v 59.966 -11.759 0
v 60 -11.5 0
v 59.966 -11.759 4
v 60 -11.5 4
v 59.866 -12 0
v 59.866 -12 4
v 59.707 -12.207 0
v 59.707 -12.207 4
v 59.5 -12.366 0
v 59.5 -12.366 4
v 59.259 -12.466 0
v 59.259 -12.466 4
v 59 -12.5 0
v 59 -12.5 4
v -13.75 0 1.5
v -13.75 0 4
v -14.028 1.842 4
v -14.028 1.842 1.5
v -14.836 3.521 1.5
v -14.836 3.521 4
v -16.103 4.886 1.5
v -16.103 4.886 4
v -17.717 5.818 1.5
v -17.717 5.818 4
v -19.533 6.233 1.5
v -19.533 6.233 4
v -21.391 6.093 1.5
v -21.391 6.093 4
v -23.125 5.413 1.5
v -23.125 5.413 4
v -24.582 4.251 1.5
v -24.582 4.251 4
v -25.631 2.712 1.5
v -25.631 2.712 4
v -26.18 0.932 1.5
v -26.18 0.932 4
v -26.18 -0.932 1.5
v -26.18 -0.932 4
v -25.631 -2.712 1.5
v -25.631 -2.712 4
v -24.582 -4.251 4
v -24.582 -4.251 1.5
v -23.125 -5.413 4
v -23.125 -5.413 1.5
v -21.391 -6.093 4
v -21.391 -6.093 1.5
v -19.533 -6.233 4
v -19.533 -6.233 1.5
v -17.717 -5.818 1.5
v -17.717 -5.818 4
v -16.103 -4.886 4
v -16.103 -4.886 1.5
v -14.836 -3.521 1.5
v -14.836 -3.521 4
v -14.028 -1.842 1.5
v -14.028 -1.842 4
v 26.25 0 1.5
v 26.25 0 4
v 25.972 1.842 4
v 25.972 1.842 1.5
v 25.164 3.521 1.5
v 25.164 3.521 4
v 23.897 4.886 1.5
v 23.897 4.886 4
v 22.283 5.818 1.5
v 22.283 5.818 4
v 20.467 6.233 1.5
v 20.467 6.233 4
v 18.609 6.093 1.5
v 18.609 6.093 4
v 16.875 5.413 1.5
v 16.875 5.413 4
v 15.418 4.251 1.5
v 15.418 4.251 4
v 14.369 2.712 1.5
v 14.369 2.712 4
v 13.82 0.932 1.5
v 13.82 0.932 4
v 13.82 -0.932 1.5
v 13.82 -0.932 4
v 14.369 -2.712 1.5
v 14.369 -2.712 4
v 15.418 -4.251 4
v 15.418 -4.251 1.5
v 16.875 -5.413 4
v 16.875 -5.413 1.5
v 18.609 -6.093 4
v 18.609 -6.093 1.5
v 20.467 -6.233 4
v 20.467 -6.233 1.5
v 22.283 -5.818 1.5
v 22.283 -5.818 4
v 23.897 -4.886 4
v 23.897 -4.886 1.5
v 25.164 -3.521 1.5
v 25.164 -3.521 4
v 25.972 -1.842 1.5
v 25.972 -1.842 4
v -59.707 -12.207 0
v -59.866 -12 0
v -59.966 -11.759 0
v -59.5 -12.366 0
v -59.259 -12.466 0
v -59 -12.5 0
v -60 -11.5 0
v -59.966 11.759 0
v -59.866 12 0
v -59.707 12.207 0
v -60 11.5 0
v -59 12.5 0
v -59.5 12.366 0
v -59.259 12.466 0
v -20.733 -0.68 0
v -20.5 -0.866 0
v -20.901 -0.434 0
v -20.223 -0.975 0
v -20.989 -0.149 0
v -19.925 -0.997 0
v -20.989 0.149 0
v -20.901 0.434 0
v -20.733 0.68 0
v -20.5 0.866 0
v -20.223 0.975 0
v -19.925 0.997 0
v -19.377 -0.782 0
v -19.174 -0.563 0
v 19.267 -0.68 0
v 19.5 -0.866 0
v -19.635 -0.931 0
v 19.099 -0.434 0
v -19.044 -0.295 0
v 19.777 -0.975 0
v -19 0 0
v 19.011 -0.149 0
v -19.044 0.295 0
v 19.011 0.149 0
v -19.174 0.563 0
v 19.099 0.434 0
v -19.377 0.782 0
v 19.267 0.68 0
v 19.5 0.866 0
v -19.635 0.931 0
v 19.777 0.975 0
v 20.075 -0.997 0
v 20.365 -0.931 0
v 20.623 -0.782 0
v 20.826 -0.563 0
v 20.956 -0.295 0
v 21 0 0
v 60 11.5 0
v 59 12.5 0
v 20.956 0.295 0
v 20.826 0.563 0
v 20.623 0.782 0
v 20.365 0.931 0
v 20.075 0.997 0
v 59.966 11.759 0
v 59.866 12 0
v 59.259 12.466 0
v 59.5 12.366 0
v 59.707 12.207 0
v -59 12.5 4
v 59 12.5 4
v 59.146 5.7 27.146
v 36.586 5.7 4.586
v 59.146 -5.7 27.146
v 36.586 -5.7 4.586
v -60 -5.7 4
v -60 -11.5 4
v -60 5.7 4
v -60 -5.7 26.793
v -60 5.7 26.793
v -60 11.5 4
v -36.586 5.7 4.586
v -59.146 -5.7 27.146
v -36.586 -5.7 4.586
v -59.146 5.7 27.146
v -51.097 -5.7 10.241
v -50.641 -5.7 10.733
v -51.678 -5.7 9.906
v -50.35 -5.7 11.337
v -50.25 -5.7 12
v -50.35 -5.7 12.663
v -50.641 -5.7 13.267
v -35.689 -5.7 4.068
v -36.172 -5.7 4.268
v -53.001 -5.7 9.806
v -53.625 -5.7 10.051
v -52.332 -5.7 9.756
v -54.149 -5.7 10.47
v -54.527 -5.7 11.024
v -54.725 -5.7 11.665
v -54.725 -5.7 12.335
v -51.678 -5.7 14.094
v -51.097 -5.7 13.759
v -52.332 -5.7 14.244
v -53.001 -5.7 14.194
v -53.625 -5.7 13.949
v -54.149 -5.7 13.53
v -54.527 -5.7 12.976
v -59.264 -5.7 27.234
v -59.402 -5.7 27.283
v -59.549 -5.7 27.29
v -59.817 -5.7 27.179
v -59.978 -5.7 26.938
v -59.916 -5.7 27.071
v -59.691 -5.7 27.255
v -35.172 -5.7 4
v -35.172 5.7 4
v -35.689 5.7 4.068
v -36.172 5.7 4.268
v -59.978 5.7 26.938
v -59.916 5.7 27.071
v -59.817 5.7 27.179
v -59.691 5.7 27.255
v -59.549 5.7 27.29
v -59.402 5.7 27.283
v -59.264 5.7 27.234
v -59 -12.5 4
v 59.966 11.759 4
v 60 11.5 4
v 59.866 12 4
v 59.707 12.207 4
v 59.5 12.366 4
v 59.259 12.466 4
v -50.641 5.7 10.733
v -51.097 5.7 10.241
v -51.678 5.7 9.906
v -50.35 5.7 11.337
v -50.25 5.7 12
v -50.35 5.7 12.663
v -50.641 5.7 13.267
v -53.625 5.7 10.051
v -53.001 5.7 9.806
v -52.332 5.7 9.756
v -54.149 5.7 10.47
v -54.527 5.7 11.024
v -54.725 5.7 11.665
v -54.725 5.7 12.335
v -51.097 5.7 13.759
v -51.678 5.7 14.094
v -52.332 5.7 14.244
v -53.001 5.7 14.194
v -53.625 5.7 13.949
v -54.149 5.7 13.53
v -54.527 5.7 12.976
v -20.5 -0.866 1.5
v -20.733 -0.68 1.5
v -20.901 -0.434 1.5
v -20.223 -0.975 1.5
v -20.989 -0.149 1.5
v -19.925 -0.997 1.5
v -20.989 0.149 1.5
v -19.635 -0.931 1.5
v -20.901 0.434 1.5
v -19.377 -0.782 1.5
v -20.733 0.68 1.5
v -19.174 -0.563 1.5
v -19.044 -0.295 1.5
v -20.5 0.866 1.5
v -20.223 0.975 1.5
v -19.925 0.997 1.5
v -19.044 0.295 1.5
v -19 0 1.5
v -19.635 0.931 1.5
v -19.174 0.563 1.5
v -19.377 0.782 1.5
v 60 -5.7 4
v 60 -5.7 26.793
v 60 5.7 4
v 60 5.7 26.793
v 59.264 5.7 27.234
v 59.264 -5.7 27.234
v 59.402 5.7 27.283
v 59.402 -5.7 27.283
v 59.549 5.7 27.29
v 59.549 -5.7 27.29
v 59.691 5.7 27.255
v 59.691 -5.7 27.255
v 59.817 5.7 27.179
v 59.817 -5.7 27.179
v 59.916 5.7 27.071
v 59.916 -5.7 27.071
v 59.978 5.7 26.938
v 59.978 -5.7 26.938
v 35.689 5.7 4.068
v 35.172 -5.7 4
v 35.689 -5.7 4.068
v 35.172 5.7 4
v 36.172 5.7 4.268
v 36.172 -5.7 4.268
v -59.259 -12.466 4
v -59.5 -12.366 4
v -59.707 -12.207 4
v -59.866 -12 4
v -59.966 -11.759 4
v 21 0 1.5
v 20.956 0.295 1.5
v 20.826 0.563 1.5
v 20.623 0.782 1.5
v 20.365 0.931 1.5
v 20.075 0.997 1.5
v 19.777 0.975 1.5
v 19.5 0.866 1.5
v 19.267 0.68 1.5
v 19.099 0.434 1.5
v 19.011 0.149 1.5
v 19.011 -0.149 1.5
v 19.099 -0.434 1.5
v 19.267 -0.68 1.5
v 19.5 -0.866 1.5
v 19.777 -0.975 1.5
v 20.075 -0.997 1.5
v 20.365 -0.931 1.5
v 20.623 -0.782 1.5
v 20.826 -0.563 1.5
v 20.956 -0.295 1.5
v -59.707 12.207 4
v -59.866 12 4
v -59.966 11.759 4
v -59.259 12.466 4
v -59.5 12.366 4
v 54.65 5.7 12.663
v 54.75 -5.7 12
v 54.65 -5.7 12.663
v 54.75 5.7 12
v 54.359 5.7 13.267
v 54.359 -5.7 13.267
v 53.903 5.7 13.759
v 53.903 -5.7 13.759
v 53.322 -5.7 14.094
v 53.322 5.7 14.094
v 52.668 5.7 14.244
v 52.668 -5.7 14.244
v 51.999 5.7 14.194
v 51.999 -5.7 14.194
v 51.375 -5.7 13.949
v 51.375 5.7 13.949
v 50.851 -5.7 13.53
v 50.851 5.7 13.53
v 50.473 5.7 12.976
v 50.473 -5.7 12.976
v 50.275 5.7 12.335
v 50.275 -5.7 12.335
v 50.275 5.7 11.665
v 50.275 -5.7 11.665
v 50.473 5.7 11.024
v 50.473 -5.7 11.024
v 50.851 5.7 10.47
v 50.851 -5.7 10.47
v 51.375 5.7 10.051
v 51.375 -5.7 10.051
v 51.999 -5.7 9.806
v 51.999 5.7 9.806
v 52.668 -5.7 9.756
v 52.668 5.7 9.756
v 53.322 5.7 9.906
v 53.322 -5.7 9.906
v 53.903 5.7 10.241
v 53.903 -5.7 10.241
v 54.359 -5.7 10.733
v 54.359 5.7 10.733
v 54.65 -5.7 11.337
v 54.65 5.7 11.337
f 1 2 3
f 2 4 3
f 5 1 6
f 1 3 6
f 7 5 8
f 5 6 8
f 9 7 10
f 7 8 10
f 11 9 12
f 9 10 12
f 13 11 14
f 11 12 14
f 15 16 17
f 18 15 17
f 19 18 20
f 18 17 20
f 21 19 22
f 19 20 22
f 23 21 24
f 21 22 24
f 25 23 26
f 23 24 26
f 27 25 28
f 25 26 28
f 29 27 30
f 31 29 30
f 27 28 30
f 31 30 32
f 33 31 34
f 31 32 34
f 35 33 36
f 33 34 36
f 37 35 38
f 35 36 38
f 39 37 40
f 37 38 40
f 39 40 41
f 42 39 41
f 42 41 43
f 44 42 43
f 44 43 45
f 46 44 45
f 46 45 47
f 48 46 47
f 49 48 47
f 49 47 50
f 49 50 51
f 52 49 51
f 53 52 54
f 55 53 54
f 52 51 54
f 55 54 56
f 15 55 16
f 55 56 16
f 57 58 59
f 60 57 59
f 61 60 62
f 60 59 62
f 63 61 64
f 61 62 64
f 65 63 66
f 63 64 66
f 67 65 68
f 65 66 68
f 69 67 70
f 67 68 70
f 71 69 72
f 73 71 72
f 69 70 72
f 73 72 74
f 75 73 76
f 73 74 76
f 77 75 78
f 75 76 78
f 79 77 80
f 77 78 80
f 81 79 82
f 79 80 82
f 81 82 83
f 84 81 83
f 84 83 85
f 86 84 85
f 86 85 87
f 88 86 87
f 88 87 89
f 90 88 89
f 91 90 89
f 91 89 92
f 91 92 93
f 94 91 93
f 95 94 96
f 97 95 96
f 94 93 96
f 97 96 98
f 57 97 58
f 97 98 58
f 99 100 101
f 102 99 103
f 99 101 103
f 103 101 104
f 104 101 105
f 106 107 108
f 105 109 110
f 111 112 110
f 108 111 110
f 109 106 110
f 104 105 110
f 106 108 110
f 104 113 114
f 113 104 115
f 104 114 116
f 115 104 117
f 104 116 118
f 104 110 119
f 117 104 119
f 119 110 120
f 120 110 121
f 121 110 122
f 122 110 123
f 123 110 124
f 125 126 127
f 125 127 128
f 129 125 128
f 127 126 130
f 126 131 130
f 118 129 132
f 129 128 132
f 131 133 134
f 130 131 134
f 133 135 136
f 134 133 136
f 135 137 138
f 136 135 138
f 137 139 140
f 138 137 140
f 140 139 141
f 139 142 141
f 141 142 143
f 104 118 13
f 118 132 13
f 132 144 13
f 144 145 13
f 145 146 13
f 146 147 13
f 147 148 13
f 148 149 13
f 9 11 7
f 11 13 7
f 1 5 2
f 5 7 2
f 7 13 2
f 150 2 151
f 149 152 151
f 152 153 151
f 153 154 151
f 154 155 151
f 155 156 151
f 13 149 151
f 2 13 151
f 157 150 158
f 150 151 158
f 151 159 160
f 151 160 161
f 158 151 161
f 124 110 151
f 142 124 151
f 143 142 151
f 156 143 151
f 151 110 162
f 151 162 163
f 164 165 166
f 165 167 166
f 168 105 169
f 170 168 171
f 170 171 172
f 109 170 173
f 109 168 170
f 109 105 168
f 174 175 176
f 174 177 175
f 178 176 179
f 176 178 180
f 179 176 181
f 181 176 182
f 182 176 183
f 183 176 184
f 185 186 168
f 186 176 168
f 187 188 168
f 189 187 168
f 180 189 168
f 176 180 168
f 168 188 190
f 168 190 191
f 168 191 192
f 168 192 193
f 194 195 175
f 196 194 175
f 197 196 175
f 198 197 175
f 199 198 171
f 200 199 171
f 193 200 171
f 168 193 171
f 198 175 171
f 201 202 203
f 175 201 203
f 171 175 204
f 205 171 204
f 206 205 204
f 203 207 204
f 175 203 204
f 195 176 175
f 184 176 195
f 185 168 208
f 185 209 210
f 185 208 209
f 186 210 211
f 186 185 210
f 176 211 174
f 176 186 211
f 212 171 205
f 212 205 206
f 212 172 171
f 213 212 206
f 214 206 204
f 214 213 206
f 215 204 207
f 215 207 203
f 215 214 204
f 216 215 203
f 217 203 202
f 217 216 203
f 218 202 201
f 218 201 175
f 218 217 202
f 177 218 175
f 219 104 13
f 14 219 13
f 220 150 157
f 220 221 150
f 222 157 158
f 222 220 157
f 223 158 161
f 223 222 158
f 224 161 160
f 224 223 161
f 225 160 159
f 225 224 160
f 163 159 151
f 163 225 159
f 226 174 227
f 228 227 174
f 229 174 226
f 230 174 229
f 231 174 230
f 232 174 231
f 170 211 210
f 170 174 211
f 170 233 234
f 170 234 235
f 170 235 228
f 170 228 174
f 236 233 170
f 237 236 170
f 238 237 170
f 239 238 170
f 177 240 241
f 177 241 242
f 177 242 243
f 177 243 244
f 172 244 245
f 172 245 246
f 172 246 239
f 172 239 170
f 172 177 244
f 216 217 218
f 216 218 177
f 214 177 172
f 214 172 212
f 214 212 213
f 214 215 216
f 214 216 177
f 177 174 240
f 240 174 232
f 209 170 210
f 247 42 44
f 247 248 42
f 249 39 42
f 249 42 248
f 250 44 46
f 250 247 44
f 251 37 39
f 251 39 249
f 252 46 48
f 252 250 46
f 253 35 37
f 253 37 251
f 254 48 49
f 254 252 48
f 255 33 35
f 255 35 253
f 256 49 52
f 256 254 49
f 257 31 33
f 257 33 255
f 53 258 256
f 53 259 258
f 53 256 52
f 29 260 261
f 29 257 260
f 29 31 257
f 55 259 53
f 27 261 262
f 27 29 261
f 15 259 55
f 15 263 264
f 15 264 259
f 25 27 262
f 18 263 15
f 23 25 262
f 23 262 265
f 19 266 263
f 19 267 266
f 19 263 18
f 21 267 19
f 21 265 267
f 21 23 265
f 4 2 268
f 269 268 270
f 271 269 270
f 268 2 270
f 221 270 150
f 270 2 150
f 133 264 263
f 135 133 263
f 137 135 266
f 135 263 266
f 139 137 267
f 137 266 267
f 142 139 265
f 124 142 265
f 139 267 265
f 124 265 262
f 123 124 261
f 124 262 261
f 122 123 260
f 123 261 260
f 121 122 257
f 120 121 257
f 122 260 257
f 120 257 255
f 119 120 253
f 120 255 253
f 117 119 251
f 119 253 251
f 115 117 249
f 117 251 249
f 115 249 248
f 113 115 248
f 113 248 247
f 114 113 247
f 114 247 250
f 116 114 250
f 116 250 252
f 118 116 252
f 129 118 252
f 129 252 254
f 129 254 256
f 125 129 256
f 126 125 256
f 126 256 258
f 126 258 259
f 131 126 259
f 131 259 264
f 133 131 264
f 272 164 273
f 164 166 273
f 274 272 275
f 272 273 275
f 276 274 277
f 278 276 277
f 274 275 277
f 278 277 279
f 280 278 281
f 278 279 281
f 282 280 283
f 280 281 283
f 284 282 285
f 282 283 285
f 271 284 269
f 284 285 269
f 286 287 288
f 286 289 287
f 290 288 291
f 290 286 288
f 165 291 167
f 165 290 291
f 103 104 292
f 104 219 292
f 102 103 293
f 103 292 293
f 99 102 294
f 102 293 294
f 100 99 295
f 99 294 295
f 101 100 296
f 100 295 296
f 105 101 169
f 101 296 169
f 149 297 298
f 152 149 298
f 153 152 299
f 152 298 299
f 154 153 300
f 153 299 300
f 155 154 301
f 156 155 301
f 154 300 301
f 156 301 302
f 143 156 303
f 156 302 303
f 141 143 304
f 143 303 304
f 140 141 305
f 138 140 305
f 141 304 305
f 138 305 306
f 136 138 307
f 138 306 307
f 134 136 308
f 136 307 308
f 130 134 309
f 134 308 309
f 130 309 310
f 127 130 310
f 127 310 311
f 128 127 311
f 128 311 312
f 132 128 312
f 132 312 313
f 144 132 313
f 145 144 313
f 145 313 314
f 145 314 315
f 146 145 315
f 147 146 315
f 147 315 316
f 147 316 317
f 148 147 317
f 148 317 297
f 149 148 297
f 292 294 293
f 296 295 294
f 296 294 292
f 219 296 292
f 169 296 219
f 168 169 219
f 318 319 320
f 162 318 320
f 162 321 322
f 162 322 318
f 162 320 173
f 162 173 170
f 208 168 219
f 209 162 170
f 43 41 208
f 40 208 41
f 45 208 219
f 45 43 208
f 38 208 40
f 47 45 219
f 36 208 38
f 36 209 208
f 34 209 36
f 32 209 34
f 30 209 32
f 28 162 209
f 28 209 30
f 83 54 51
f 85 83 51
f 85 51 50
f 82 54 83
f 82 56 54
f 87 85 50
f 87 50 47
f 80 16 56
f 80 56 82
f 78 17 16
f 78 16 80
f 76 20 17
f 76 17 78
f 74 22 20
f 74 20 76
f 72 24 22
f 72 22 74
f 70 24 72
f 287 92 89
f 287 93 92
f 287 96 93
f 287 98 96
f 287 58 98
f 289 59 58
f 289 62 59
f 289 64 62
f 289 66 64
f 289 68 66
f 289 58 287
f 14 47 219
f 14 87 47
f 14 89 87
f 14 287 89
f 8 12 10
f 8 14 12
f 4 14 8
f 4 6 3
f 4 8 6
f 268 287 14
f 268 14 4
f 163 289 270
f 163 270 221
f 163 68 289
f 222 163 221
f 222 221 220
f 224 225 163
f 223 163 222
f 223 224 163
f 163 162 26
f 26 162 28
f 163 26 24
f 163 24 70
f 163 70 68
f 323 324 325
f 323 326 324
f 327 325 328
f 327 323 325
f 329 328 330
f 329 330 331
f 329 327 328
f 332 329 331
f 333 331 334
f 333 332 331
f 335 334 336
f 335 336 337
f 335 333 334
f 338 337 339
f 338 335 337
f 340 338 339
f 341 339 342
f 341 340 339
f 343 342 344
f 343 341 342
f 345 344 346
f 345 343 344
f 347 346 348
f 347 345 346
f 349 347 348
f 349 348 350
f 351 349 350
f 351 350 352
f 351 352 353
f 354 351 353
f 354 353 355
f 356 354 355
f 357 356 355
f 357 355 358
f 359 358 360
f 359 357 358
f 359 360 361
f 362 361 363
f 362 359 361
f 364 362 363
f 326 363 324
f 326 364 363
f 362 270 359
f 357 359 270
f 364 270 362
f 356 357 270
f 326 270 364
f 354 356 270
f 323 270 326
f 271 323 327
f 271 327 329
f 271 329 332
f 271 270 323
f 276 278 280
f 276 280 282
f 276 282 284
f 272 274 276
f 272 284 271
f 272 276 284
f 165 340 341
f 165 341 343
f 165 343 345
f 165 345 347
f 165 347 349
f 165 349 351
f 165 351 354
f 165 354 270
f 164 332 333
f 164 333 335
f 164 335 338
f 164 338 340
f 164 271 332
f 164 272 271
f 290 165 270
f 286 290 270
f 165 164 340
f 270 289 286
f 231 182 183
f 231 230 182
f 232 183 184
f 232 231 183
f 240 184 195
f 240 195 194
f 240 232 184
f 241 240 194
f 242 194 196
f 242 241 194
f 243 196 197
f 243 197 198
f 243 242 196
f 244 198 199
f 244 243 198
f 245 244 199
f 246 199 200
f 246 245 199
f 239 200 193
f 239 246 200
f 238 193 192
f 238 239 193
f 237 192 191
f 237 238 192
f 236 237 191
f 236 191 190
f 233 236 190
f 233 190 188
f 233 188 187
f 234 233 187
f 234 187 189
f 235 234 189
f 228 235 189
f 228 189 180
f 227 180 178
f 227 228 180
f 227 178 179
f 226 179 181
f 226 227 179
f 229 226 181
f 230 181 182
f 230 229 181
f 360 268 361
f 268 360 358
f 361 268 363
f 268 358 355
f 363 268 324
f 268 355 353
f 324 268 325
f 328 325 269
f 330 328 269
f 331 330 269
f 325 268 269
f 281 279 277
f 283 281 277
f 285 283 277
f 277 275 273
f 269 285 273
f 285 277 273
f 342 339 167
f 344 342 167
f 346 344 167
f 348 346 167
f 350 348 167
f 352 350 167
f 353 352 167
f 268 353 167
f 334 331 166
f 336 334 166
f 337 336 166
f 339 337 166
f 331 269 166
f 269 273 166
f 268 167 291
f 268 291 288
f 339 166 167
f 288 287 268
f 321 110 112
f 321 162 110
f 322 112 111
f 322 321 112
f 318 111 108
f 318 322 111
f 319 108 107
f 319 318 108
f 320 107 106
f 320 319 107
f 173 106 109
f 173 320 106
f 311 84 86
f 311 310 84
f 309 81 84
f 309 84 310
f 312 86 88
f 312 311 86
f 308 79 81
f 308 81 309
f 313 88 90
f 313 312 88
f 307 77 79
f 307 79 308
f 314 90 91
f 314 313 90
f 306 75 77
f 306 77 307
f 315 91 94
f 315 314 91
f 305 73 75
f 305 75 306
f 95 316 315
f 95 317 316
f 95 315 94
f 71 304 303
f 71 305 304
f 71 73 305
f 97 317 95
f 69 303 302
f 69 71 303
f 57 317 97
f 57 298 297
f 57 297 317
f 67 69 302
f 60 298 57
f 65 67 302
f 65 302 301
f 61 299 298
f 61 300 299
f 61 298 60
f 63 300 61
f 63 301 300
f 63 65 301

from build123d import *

# Parameters (mm, degrees)
SKETCH_W        = 120
SKETCH_H        = 25
PAD_DEPTH       = 4
SKETCH001_R     = 2.25
PAD001_DEPTH    = 5.7
FILLET_R        = 2
FILLET001_R     = 0.5
FILLET002_R     = 1
SKETCH002_R     = 6.25
POCKET_DEPTH    = 2.5
SKETCH003_R     = 1
POCKET001_DEPTH = 1.501


with BuildPart() as part:
    # Sketch → Pad (new body)
    with BuildSketch(Plane.XY):
        Rectangle(SKETCH_W, SKETCH_H)
    extrude(amount=PAD_DEPTH)

    # Sketch001 → Pad001 (join, symmetric)
    with BuildSketch(Plane.XZ):
        Polygon((-60, 4), (-60, 28), (-36, 4), align=None)
        with Locations((-52.5, 12)):
            Circle(SKETCH001_R, mode=Mode.SUBTRACT)
        Polygon((60, 4), (36, 4), (60, 28), align=None)
        with Locations((52.5, 12)):
            Circle(SKETCH001_R, mode=Mode.SUBTRACT)
    extrude(amount=PAD001_DEPTH, both=True)

    # Fillet
    fillet_edges = [part.edges().sort_by_distance(p)[0] for p in [
        (-36, 0, 4),
        (36, 0, 4),
    ]]
    fillet(fillet_edges, radius=FILLET_R)

    # Fillet001
    fillet001_edges = [part.edges().sort_by_distance(p)[0] for p in [
        (-60, 0, 28),
        (60, 0, 28),
    ]]
    fillet(fillet001_edges, radius=FILLET001_R)

    # Fillet002
    fillet002_edges = [part.edges().sort_by_distance(p)[0] for p in [
        (-60, 12.5, 2),
        (-60, -12.5, 2),
        (60, -12.5, 2),
        (60, 12.5, 2),
    ]]
    fillet(fillet002_edges, radius=FILLET002_R)

    # Sketch002 (on Face1 of Fillet002) → Pocket (cut)
    with BuildSketch(Plane.XY.offset(4)):
        with Locations((-20, 0)):
            Circle(SKETCH002_R)
        with Locations((20, 0)):
            Circle(SKETCH002_R)
    extrude(amount=-POCKET_DEPTH, mode=Mode.SUBTRACT)

    # Sketch003 (on Face27 of Pocket) → Pocket001 (cut, through all)
    with BuildSketch(Plane.XY.offset(1.5)):
        with Locations((-20, 0)):
            Circle(SKETCH003_R)
        with Locations((20, 0)):
            Circle(SKETCH003_R)
    extrude(amount=-POCKET001_DEPTH, mode=Mode.SUBTRACT)


solid = part.part
